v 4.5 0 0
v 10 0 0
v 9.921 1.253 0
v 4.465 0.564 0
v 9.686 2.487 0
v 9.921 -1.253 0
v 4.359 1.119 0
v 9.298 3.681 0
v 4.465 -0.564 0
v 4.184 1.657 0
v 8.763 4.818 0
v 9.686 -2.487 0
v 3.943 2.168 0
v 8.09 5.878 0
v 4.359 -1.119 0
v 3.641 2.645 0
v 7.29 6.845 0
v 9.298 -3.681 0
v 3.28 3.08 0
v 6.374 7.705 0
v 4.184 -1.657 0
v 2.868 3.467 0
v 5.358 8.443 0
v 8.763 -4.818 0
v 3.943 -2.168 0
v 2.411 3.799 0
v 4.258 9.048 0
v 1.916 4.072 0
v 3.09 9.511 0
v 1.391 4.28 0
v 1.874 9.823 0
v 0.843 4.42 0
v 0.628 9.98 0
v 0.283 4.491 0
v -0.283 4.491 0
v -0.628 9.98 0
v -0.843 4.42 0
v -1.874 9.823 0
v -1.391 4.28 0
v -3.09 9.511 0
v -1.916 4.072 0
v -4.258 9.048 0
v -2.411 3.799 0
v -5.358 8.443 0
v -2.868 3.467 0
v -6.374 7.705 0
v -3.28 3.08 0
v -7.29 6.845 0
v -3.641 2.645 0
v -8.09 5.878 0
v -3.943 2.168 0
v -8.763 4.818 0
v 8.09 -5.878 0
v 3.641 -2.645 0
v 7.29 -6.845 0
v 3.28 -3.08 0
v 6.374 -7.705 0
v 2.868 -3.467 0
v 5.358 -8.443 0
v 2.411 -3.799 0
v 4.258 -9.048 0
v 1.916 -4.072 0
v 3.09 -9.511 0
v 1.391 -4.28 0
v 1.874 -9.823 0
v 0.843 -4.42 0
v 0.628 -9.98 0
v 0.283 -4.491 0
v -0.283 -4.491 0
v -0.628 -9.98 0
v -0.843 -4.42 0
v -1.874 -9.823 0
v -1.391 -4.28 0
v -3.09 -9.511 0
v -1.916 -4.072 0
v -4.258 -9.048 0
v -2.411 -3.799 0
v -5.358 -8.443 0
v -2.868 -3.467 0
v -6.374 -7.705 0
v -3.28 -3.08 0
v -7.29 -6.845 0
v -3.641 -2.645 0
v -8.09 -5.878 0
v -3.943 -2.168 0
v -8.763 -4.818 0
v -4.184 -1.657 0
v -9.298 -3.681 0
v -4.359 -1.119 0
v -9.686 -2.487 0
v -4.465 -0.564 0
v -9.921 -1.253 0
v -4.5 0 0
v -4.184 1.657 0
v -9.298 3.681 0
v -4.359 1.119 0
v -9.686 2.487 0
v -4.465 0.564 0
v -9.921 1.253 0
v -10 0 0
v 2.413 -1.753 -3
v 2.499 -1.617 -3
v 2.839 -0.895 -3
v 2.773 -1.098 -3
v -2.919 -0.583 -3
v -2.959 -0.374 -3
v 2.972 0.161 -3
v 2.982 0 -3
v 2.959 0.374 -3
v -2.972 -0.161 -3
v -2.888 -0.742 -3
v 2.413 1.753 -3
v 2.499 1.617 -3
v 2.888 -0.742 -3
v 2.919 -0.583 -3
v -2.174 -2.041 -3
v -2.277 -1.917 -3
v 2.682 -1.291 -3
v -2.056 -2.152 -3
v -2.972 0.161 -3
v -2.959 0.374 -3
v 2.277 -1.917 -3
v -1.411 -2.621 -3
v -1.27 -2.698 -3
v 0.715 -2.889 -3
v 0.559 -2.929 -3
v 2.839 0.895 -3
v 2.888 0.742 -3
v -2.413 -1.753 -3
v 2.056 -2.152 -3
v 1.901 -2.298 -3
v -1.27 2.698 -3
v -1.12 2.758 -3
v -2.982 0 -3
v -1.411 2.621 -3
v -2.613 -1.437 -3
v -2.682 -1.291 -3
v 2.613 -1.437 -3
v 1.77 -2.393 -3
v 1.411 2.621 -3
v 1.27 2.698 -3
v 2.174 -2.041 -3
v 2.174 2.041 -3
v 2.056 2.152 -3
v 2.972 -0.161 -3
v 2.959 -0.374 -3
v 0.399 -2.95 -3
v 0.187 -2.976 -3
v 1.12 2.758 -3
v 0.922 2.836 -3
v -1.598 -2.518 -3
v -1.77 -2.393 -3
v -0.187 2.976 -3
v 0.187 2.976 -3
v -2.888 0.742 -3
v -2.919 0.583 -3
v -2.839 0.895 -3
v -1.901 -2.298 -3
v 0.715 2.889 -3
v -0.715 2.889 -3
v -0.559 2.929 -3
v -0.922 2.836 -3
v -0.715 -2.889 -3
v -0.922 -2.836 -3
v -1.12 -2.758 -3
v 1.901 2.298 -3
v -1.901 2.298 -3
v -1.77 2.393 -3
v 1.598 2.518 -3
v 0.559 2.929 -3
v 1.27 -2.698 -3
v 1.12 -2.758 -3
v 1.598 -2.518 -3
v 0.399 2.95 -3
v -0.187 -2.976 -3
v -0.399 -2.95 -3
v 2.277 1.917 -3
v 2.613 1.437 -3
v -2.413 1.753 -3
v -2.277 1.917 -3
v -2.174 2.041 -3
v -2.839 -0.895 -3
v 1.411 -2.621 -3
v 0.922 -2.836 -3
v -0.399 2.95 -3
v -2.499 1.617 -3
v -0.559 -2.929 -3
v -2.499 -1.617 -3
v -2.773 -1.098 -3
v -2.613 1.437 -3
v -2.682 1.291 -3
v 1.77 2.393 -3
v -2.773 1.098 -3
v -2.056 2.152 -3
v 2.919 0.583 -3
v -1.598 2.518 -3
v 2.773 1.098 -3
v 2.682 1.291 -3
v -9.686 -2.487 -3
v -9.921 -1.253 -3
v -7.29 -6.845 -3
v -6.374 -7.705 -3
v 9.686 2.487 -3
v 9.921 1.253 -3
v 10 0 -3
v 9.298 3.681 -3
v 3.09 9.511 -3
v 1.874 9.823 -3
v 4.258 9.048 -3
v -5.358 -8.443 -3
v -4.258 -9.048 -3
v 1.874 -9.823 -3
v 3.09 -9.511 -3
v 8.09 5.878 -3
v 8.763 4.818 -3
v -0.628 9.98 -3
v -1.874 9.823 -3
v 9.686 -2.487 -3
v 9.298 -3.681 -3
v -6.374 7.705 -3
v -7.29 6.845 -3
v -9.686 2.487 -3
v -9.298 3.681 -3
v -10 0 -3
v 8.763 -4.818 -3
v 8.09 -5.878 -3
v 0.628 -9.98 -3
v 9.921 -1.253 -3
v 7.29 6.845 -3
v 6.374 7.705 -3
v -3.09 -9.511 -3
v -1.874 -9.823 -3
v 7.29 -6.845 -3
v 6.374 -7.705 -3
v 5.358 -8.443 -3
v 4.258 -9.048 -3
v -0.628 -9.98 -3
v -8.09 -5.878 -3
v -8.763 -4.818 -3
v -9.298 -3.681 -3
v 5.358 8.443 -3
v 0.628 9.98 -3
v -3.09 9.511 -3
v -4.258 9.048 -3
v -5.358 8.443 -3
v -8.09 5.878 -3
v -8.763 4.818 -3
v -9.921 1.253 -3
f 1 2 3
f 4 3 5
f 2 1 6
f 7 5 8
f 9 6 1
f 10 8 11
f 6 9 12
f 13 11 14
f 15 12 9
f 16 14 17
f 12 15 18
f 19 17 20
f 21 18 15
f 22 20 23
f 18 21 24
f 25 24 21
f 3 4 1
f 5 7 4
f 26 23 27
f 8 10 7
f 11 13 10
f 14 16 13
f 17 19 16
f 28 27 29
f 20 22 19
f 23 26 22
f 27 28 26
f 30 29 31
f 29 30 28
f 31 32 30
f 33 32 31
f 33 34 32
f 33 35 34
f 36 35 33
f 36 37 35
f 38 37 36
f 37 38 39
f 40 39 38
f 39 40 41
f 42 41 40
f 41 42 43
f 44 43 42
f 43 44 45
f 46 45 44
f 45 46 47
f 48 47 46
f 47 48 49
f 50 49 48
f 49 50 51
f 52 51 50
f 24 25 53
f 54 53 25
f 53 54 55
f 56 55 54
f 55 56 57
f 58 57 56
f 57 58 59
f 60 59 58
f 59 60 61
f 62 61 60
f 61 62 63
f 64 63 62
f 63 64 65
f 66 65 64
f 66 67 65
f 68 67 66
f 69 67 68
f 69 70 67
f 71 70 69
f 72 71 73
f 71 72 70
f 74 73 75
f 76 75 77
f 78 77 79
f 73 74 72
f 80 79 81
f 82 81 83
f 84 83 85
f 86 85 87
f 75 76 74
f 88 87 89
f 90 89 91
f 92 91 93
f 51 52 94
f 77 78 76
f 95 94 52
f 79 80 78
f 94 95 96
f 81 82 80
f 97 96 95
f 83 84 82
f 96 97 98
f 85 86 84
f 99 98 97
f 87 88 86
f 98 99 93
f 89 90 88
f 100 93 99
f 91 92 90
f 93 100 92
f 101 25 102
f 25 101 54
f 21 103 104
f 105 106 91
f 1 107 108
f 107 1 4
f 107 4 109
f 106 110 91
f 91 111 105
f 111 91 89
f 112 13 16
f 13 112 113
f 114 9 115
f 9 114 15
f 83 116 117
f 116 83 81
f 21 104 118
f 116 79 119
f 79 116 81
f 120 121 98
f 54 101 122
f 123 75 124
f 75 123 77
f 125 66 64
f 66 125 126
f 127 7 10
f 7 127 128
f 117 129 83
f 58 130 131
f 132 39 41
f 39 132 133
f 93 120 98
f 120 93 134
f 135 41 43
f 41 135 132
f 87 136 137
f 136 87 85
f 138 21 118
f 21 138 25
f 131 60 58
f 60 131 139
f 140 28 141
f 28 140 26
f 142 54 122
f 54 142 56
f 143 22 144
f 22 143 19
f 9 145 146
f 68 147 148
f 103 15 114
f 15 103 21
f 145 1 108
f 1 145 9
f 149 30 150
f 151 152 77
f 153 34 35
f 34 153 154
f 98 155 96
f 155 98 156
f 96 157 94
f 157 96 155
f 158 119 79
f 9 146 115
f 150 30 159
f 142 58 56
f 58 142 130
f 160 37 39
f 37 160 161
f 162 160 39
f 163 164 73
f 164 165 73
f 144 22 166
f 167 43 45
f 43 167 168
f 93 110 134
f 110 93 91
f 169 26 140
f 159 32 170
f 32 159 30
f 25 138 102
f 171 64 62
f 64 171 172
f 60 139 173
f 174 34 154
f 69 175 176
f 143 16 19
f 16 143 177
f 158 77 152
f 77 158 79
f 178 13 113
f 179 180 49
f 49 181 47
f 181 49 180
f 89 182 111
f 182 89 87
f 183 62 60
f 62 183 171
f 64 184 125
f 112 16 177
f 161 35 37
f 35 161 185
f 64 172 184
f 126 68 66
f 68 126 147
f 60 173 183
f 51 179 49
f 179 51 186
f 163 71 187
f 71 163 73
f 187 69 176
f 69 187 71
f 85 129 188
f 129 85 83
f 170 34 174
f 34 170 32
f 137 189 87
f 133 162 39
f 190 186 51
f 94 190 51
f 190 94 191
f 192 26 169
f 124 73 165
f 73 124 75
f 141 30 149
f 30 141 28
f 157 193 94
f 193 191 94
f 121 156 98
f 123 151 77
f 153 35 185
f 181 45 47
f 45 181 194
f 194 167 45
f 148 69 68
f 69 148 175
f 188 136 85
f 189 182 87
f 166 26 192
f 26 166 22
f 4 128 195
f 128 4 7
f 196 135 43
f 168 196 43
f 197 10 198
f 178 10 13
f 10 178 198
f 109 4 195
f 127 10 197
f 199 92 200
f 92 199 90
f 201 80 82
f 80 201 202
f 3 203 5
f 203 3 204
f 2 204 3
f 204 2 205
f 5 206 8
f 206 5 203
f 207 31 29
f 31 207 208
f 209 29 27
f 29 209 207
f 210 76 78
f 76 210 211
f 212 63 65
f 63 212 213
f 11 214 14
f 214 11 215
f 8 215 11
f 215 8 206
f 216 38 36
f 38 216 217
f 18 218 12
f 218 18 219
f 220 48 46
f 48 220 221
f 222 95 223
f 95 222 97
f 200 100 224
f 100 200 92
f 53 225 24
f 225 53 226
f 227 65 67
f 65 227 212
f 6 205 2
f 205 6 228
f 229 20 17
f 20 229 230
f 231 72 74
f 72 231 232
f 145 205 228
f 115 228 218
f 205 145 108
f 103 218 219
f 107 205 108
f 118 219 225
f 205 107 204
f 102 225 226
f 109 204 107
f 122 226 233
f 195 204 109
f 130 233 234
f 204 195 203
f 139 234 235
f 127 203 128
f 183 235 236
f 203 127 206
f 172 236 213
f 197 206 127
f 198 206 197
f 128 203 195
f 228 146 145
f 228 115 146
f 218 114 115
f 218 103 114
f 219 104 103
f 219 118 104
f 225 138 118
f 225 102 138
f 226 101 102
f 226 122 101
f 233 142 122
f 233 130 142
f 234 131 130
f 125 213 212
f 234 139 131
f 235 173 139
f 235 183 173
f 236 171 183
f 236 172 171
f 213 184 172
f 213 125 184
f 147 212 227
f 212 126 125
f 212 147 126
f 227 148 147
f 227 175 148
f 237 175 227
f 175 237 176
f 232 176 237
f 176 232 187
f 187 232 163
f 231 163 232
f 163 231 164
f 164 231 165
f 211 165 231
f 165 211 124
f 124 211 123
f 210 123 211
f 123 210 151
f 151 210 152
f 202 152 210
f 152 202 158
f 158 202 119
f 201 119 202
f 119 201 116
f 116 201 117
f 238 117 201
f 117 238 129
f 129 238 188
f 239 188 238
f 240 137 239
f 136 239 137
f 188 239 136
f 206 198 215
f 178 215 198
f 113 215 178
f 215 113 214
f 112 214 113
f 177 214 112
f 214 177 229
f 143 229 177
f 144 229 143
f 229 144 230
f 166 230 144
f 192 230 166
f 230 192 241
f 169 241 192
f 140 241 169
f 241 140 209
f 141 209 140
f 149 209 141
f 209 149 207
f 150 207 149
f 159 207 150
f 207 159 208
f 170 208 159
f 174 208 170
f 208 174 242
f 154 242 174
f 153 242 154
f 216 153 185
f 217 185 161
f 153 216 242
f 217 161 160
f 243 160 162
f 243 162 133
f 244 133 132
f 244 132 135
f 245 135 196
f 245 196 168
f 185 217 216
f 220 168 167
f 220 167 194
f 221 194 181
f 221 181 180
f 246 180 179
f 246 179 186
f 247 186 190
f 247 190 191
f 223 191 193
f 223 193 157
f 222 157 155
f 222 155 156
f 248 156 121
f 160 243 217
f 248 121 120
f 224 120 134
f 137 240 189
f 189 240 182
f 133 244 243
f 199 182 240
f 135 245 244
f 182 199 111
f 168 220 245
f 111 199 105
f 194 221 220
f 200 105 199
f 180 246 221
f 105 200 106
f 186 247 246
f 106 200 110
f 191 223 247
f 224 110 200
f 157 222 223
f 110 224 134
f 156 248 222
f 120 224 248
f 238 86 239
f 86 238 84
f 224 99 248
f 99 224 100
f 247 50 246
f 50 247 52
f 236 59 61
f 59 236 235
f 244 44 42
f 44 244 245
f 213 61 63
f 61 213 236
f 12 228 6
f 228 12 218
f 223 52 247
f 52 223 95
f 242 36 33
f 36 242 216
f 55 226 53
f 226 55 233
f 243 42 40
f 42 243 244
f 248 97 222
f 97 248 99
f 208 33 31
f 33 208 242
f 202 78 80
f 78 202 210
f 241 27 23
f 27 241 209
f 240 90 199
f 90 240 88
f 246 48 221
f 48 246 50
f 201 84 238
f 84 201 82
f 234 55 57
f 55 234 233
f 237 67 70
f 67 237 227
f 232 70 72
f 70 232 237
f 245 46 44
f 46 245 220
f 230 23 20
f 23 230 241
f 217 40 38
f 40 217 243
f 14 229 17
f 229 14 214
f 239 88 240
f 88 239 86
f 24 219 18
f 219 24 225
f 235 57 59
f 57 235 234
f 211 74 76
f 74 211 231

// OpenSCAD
$fn = 50;

difference() {
	union() {
		translate(v = [0, 0, -3.0]) {
			cylinder(h = 3, r = 10.0);
		}
	}
	union() {
		translate(v = [0, 0, 0]) {
			rotate(a = [0, 0, 0]) {
				difference() {
					union() {
						translate(v = [0, 0, -6.0]) {
							cylinder(h = 6, r = 2.25);
						}
						translate(v = [0, 0, -4.2]) {
							cylinder(h = 4.2, r1 = 2.375, r2 = 4.5);
						}
						translate(v = [0, 0, -6.0]) {
							cylinder(h = 6, r = 2.375);
						}
						translate(v = [0, 0, -6.0]) {
							cylinder(h = 6, r = 2.25);
						}
					}
					union();
				}
			}
		}
	}
}
